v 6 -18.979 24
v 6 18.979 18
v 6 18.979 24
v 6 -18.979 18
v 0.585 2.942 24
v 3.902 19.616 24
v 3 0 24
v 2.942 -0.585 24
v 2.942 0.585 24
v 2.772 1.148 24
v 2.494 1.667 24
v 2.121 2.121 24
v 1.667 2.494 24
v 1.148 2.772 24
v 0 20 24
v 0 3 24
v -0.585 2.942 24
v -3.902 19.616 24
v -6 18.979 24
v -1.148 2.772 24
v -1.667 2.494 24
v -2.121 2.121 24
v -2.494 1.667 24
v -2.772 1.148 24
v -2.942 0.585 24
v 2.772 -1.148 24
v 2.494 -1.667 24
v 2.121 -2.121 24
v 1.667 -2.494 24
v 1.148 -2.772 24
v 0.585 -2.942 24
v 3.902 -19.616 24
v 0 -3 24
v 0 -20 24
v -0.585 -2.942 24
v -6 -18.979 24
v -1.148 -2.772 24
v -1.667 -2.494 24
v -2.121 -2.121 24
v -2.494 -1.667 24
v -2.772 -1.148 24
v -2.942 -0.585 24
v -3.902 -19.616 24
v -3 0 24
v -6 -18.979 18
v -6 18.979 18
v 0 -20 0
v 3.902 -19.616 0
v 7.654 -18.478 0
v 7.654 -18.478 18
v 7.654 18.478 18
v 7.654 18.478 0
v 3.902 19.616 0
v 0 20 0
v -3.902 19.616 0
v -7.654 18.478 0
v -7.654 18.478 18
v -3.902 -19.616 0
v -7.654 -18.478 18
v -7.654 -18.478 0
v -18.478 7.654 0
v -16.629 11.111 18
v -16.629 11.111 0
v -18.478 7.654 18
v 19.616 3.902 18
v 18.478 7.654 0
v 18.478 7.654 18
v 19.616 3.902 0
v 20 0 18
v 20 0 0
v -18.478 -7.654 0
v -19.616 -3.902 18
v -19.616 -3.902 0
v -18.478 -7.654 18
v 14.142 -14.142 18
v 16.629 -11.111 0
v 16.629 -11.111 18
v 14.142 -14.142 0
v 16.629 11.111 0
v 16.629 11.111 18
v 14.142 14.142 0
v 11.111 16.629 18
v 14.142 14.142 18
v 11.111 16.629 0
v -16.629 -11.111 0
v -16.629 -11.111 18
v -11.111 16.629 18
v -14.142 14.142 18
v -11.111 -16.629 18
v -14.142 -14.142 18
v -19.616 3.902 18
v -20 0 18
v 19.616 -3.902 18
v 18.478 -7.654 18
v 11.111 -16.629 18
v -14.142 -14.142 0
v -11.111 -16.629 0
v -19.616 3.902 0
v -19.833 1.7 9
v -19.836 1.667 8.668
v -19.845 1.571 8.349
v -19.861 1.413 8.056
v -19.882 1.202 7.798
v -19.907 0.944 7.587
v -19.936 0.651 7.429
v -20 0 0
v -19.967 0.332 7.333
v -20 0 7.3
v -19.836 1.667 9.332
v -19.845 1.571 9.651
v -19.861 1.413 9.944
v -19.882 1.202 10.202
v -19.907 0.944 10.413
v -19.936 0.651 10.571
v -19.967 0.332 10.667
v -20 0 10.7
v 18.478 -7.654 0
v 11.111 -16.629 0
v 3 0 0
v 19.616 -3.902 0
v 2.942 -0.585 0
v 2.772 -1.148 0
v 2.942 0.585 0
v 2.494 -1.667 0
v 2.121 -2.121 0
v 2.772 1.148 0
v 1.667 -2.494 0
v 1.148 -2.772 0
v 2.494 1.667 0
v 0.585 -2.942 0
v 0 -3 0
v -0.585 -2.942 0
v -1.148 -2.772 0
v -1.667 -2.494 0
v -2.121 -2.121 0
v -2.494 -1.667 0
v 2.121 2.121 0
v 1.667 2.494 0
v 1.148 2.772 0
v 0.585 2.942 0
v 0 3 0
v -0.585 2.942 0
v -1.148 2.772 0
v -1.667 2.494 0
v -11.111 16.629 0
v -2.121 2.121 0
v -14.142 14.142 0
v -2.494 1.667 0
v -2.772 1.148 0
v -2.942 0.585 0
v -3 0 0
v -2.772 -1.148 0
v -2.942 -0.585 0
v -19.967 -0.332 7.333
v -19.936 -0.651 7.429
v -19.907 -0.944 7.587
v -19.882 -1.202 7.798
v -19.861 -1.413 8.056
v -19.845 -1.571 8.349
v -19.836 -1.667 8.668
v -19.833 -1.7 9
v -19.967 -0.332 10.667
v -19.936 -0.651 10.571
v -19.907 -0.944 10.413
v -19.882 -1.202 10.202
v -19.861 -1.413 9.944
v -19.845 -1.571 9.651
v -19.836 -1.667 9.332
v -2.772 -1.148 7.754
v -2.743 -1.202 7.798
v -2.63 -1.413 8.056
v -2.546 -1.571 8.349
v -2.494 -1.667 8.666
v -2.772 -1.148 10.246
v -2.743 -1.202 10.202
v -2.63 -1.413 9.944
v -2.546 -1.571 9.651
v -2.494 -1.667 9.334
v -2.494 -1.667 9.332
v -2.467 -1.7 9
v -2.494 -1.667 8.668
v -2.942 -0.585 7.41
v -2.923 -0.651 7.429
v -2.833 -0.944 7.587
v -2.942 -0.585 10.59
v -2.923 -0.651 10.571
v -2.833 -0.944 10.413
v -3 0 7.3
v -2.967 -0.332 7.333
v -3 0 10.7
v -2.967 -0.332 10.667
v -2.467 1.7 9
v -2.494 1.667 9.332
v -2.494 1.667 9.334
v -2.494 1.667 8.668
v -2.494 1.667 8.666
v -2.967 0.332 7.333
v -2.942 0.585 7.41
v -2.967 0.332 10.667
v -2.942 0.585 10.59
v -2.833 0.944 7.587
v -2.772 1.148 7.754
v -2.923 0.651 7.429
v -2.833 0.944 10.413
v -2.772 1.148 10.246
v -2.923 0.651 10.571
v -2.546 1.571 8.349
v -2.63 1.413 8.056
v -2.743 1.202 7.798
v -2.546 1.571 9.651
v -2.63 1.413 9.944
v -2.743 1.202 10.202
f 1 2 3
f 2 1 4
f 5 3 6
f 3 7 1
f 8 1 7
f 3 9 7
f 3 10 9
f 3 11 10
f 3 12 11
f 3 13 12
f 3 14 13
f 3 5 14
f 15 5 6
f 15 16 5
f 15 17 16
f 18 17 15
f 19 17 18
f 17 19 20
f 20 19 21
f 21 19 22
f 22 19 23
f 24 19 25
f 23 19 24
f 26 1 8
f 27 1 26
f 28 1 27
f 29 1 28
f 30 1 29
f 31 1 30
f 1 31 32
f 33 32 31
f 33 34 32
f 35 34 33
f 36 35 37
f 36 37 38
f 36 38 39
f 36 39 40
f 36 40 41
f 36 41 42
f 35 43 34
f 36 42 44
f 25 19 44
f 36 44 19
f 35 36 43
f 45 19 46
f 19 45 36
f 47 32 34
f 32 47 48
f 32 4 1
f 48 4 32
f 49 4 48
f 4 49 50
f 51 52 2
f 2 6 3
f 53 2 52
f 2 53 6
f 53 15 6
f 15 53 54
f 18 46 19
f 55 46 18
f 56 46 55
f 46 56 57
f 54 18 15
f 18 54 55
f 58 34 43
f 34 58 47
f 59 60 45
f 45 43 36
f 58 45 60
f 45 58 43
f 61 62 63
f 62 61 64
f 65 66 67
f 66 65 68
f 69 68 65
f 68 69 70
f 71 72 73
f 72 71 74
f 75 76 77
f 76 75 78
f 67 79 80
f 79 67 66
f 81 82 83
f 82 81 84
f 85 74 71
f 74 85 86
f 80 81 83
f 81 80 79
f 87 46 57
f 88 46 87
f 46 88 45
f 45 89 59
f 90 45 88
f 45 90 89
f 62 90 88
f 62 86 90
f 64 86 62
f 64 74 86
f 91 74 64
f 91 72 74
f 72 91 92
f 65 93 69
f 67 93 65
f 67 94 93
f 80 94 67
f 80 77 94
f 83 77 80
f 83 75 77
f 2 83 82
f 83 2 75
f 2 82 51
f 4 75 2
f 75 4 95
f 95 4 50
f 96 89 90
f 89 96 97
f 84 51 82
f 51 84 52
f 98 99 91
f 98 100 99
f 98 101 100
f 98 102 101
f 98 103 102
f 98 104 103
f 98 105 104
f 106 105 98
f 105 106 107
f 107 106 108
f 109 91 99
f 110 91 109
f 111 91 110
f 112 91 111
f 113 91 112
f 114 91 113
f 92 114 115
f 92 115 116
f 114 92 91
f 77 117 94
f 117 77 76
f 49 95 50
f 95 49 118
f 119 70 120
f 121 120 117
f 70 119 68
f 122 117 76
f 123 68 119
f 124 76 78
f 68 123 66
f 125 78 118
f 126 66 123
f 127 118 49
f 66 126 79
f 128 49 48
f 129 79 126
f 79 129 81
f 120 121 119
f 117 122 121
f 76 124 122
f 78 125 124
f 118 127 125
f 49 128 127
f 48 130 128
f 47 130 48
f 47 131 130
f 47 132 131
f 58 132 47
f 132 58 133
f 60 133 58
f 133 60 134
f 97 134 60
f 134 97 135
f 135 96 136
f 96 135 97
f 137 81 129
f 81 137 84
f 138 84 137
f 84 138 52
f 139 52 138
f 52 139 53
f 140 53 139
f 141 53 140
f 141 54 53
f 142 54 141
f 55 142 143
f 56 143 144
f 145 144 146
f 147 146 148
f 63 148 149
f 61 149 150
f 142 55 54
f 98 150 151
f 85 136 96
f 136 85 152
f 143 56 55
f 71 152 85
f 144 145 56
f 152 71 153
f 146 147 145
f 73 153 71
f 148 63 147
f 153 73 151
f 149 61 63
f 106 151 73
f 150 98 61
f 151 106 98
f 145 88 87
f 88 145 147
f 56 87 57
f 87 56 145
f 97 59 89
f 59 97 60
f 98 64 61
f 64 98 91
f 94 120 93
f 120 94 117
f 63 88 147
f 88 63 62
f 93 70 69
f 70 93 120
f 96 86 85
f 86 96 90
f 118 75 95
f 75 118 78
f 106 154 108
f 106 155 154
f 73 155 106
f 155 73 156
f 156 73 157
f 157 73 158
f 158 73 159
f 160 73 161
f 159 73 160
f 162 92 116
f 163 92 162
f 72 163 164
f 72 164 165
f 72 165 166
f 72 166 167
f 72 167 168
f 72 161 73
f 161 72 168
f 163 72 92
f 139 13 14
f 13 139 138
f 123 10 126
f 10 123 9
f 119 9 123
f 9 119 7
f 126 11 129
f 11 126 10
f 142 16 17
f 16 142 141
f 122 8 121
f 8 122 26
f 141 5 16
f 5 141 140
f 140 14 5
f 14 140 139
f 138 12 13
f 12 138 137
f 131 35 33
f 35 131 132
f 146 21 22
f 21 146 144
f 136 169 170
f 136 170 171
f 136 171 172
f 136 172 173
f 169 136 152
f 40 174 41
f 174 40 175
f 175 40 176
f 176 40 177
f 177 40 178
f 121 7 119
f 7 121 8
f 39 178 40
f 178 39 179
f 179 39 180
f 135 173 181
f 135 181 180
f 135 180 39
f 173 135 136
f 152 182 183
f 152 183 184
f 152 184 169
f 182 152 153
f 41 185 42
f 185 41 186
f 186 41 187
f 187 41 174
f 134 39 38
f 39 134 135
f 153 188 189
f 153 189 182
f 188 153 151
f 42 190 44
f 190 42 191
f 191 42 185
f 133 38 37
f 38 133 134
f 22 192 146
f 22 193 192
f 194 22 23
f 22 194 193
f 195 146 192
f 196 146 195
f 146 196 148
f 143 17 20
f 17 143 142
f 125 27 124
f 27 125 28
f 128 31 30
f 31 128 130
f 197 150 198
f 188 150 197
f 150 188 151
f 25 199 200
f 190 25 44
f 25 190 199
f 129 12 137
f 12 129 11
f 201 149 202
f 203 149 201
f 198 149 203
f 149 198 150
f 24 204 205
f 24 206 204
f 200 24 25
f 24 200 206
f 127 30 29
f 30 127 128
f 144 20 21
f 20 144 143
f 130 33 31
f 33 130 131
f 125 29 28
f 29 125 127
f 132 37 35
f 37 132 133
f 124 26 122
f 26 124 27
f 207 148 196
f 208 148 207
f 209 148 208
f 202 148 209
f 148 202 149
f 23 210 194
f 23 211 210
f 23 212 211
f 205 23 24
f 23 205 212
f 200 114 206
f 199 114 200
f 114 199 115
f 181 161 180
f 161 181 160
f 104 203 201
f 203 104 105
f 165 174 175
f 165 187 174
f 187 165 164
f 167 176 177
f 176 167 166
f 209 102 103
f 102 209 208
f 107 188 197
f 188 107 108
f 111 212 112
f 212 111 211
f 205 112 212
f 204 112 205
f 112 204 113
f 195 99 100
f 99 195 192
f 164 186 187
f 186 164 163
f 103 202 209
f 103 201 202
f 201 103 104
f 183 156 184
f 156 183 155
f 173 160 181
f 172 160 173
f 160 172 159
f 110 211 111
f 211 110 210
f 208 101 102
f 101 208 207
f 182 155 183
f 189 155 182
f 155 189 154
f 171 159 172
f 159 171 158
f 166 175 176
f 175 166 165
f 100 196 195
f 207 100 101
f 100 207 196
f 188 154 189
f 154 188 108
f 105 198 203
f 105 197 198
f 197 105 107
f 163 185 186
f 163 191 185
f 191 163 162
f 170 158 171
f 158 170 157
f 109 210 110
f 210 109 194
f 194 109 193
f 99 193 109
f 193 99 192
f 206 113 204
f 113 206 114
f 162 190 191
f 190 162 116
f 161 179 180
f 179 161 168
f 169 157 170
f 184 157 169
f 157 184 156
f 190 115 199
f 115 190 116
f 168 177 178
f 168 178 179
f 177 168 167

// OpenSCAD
$fn = 32;

// ----------------------------------------------------------------------
// Oldham coupling hub: 40 x 24 mm
// ----------------------------------------------------------------------

// --- parameters (mm) ---
body_d = 40;              // hub diameter
body_l = 18;              // hub length
shaft_d = 6;              // shaft bore
cam_w = 12;               // drive tongue width
tongue_h = 6;             // drive tongue height
set_d = 3.4;              // set screw tap hole

module hub() {
  cylinder(h = body_l, d = body_d);
  /* tongue, clipped to the hub disc and sunk 1 mm into the face */
  intersection() {
    translate([-cam_w / 2, -body_d / 2, body_l - 1])
      cube([cam_w, body_d, tongue_h + 1]);
    translate([0, 0, body_l - 1]) cylinder(h = tongue_h + 1, d = body_d);
  }
}

difference() {
  hub();
  translate([0, 0, -1]) cylinder(h = body_l + tongue_h + 2, d = shaft_d);
  translate([-body_d / 2 - 1, 0, body_l * 0.5])
    rotate([0, 90, 0]) cylinder(h = body_d / 2 + 2, d = set_d);
}
